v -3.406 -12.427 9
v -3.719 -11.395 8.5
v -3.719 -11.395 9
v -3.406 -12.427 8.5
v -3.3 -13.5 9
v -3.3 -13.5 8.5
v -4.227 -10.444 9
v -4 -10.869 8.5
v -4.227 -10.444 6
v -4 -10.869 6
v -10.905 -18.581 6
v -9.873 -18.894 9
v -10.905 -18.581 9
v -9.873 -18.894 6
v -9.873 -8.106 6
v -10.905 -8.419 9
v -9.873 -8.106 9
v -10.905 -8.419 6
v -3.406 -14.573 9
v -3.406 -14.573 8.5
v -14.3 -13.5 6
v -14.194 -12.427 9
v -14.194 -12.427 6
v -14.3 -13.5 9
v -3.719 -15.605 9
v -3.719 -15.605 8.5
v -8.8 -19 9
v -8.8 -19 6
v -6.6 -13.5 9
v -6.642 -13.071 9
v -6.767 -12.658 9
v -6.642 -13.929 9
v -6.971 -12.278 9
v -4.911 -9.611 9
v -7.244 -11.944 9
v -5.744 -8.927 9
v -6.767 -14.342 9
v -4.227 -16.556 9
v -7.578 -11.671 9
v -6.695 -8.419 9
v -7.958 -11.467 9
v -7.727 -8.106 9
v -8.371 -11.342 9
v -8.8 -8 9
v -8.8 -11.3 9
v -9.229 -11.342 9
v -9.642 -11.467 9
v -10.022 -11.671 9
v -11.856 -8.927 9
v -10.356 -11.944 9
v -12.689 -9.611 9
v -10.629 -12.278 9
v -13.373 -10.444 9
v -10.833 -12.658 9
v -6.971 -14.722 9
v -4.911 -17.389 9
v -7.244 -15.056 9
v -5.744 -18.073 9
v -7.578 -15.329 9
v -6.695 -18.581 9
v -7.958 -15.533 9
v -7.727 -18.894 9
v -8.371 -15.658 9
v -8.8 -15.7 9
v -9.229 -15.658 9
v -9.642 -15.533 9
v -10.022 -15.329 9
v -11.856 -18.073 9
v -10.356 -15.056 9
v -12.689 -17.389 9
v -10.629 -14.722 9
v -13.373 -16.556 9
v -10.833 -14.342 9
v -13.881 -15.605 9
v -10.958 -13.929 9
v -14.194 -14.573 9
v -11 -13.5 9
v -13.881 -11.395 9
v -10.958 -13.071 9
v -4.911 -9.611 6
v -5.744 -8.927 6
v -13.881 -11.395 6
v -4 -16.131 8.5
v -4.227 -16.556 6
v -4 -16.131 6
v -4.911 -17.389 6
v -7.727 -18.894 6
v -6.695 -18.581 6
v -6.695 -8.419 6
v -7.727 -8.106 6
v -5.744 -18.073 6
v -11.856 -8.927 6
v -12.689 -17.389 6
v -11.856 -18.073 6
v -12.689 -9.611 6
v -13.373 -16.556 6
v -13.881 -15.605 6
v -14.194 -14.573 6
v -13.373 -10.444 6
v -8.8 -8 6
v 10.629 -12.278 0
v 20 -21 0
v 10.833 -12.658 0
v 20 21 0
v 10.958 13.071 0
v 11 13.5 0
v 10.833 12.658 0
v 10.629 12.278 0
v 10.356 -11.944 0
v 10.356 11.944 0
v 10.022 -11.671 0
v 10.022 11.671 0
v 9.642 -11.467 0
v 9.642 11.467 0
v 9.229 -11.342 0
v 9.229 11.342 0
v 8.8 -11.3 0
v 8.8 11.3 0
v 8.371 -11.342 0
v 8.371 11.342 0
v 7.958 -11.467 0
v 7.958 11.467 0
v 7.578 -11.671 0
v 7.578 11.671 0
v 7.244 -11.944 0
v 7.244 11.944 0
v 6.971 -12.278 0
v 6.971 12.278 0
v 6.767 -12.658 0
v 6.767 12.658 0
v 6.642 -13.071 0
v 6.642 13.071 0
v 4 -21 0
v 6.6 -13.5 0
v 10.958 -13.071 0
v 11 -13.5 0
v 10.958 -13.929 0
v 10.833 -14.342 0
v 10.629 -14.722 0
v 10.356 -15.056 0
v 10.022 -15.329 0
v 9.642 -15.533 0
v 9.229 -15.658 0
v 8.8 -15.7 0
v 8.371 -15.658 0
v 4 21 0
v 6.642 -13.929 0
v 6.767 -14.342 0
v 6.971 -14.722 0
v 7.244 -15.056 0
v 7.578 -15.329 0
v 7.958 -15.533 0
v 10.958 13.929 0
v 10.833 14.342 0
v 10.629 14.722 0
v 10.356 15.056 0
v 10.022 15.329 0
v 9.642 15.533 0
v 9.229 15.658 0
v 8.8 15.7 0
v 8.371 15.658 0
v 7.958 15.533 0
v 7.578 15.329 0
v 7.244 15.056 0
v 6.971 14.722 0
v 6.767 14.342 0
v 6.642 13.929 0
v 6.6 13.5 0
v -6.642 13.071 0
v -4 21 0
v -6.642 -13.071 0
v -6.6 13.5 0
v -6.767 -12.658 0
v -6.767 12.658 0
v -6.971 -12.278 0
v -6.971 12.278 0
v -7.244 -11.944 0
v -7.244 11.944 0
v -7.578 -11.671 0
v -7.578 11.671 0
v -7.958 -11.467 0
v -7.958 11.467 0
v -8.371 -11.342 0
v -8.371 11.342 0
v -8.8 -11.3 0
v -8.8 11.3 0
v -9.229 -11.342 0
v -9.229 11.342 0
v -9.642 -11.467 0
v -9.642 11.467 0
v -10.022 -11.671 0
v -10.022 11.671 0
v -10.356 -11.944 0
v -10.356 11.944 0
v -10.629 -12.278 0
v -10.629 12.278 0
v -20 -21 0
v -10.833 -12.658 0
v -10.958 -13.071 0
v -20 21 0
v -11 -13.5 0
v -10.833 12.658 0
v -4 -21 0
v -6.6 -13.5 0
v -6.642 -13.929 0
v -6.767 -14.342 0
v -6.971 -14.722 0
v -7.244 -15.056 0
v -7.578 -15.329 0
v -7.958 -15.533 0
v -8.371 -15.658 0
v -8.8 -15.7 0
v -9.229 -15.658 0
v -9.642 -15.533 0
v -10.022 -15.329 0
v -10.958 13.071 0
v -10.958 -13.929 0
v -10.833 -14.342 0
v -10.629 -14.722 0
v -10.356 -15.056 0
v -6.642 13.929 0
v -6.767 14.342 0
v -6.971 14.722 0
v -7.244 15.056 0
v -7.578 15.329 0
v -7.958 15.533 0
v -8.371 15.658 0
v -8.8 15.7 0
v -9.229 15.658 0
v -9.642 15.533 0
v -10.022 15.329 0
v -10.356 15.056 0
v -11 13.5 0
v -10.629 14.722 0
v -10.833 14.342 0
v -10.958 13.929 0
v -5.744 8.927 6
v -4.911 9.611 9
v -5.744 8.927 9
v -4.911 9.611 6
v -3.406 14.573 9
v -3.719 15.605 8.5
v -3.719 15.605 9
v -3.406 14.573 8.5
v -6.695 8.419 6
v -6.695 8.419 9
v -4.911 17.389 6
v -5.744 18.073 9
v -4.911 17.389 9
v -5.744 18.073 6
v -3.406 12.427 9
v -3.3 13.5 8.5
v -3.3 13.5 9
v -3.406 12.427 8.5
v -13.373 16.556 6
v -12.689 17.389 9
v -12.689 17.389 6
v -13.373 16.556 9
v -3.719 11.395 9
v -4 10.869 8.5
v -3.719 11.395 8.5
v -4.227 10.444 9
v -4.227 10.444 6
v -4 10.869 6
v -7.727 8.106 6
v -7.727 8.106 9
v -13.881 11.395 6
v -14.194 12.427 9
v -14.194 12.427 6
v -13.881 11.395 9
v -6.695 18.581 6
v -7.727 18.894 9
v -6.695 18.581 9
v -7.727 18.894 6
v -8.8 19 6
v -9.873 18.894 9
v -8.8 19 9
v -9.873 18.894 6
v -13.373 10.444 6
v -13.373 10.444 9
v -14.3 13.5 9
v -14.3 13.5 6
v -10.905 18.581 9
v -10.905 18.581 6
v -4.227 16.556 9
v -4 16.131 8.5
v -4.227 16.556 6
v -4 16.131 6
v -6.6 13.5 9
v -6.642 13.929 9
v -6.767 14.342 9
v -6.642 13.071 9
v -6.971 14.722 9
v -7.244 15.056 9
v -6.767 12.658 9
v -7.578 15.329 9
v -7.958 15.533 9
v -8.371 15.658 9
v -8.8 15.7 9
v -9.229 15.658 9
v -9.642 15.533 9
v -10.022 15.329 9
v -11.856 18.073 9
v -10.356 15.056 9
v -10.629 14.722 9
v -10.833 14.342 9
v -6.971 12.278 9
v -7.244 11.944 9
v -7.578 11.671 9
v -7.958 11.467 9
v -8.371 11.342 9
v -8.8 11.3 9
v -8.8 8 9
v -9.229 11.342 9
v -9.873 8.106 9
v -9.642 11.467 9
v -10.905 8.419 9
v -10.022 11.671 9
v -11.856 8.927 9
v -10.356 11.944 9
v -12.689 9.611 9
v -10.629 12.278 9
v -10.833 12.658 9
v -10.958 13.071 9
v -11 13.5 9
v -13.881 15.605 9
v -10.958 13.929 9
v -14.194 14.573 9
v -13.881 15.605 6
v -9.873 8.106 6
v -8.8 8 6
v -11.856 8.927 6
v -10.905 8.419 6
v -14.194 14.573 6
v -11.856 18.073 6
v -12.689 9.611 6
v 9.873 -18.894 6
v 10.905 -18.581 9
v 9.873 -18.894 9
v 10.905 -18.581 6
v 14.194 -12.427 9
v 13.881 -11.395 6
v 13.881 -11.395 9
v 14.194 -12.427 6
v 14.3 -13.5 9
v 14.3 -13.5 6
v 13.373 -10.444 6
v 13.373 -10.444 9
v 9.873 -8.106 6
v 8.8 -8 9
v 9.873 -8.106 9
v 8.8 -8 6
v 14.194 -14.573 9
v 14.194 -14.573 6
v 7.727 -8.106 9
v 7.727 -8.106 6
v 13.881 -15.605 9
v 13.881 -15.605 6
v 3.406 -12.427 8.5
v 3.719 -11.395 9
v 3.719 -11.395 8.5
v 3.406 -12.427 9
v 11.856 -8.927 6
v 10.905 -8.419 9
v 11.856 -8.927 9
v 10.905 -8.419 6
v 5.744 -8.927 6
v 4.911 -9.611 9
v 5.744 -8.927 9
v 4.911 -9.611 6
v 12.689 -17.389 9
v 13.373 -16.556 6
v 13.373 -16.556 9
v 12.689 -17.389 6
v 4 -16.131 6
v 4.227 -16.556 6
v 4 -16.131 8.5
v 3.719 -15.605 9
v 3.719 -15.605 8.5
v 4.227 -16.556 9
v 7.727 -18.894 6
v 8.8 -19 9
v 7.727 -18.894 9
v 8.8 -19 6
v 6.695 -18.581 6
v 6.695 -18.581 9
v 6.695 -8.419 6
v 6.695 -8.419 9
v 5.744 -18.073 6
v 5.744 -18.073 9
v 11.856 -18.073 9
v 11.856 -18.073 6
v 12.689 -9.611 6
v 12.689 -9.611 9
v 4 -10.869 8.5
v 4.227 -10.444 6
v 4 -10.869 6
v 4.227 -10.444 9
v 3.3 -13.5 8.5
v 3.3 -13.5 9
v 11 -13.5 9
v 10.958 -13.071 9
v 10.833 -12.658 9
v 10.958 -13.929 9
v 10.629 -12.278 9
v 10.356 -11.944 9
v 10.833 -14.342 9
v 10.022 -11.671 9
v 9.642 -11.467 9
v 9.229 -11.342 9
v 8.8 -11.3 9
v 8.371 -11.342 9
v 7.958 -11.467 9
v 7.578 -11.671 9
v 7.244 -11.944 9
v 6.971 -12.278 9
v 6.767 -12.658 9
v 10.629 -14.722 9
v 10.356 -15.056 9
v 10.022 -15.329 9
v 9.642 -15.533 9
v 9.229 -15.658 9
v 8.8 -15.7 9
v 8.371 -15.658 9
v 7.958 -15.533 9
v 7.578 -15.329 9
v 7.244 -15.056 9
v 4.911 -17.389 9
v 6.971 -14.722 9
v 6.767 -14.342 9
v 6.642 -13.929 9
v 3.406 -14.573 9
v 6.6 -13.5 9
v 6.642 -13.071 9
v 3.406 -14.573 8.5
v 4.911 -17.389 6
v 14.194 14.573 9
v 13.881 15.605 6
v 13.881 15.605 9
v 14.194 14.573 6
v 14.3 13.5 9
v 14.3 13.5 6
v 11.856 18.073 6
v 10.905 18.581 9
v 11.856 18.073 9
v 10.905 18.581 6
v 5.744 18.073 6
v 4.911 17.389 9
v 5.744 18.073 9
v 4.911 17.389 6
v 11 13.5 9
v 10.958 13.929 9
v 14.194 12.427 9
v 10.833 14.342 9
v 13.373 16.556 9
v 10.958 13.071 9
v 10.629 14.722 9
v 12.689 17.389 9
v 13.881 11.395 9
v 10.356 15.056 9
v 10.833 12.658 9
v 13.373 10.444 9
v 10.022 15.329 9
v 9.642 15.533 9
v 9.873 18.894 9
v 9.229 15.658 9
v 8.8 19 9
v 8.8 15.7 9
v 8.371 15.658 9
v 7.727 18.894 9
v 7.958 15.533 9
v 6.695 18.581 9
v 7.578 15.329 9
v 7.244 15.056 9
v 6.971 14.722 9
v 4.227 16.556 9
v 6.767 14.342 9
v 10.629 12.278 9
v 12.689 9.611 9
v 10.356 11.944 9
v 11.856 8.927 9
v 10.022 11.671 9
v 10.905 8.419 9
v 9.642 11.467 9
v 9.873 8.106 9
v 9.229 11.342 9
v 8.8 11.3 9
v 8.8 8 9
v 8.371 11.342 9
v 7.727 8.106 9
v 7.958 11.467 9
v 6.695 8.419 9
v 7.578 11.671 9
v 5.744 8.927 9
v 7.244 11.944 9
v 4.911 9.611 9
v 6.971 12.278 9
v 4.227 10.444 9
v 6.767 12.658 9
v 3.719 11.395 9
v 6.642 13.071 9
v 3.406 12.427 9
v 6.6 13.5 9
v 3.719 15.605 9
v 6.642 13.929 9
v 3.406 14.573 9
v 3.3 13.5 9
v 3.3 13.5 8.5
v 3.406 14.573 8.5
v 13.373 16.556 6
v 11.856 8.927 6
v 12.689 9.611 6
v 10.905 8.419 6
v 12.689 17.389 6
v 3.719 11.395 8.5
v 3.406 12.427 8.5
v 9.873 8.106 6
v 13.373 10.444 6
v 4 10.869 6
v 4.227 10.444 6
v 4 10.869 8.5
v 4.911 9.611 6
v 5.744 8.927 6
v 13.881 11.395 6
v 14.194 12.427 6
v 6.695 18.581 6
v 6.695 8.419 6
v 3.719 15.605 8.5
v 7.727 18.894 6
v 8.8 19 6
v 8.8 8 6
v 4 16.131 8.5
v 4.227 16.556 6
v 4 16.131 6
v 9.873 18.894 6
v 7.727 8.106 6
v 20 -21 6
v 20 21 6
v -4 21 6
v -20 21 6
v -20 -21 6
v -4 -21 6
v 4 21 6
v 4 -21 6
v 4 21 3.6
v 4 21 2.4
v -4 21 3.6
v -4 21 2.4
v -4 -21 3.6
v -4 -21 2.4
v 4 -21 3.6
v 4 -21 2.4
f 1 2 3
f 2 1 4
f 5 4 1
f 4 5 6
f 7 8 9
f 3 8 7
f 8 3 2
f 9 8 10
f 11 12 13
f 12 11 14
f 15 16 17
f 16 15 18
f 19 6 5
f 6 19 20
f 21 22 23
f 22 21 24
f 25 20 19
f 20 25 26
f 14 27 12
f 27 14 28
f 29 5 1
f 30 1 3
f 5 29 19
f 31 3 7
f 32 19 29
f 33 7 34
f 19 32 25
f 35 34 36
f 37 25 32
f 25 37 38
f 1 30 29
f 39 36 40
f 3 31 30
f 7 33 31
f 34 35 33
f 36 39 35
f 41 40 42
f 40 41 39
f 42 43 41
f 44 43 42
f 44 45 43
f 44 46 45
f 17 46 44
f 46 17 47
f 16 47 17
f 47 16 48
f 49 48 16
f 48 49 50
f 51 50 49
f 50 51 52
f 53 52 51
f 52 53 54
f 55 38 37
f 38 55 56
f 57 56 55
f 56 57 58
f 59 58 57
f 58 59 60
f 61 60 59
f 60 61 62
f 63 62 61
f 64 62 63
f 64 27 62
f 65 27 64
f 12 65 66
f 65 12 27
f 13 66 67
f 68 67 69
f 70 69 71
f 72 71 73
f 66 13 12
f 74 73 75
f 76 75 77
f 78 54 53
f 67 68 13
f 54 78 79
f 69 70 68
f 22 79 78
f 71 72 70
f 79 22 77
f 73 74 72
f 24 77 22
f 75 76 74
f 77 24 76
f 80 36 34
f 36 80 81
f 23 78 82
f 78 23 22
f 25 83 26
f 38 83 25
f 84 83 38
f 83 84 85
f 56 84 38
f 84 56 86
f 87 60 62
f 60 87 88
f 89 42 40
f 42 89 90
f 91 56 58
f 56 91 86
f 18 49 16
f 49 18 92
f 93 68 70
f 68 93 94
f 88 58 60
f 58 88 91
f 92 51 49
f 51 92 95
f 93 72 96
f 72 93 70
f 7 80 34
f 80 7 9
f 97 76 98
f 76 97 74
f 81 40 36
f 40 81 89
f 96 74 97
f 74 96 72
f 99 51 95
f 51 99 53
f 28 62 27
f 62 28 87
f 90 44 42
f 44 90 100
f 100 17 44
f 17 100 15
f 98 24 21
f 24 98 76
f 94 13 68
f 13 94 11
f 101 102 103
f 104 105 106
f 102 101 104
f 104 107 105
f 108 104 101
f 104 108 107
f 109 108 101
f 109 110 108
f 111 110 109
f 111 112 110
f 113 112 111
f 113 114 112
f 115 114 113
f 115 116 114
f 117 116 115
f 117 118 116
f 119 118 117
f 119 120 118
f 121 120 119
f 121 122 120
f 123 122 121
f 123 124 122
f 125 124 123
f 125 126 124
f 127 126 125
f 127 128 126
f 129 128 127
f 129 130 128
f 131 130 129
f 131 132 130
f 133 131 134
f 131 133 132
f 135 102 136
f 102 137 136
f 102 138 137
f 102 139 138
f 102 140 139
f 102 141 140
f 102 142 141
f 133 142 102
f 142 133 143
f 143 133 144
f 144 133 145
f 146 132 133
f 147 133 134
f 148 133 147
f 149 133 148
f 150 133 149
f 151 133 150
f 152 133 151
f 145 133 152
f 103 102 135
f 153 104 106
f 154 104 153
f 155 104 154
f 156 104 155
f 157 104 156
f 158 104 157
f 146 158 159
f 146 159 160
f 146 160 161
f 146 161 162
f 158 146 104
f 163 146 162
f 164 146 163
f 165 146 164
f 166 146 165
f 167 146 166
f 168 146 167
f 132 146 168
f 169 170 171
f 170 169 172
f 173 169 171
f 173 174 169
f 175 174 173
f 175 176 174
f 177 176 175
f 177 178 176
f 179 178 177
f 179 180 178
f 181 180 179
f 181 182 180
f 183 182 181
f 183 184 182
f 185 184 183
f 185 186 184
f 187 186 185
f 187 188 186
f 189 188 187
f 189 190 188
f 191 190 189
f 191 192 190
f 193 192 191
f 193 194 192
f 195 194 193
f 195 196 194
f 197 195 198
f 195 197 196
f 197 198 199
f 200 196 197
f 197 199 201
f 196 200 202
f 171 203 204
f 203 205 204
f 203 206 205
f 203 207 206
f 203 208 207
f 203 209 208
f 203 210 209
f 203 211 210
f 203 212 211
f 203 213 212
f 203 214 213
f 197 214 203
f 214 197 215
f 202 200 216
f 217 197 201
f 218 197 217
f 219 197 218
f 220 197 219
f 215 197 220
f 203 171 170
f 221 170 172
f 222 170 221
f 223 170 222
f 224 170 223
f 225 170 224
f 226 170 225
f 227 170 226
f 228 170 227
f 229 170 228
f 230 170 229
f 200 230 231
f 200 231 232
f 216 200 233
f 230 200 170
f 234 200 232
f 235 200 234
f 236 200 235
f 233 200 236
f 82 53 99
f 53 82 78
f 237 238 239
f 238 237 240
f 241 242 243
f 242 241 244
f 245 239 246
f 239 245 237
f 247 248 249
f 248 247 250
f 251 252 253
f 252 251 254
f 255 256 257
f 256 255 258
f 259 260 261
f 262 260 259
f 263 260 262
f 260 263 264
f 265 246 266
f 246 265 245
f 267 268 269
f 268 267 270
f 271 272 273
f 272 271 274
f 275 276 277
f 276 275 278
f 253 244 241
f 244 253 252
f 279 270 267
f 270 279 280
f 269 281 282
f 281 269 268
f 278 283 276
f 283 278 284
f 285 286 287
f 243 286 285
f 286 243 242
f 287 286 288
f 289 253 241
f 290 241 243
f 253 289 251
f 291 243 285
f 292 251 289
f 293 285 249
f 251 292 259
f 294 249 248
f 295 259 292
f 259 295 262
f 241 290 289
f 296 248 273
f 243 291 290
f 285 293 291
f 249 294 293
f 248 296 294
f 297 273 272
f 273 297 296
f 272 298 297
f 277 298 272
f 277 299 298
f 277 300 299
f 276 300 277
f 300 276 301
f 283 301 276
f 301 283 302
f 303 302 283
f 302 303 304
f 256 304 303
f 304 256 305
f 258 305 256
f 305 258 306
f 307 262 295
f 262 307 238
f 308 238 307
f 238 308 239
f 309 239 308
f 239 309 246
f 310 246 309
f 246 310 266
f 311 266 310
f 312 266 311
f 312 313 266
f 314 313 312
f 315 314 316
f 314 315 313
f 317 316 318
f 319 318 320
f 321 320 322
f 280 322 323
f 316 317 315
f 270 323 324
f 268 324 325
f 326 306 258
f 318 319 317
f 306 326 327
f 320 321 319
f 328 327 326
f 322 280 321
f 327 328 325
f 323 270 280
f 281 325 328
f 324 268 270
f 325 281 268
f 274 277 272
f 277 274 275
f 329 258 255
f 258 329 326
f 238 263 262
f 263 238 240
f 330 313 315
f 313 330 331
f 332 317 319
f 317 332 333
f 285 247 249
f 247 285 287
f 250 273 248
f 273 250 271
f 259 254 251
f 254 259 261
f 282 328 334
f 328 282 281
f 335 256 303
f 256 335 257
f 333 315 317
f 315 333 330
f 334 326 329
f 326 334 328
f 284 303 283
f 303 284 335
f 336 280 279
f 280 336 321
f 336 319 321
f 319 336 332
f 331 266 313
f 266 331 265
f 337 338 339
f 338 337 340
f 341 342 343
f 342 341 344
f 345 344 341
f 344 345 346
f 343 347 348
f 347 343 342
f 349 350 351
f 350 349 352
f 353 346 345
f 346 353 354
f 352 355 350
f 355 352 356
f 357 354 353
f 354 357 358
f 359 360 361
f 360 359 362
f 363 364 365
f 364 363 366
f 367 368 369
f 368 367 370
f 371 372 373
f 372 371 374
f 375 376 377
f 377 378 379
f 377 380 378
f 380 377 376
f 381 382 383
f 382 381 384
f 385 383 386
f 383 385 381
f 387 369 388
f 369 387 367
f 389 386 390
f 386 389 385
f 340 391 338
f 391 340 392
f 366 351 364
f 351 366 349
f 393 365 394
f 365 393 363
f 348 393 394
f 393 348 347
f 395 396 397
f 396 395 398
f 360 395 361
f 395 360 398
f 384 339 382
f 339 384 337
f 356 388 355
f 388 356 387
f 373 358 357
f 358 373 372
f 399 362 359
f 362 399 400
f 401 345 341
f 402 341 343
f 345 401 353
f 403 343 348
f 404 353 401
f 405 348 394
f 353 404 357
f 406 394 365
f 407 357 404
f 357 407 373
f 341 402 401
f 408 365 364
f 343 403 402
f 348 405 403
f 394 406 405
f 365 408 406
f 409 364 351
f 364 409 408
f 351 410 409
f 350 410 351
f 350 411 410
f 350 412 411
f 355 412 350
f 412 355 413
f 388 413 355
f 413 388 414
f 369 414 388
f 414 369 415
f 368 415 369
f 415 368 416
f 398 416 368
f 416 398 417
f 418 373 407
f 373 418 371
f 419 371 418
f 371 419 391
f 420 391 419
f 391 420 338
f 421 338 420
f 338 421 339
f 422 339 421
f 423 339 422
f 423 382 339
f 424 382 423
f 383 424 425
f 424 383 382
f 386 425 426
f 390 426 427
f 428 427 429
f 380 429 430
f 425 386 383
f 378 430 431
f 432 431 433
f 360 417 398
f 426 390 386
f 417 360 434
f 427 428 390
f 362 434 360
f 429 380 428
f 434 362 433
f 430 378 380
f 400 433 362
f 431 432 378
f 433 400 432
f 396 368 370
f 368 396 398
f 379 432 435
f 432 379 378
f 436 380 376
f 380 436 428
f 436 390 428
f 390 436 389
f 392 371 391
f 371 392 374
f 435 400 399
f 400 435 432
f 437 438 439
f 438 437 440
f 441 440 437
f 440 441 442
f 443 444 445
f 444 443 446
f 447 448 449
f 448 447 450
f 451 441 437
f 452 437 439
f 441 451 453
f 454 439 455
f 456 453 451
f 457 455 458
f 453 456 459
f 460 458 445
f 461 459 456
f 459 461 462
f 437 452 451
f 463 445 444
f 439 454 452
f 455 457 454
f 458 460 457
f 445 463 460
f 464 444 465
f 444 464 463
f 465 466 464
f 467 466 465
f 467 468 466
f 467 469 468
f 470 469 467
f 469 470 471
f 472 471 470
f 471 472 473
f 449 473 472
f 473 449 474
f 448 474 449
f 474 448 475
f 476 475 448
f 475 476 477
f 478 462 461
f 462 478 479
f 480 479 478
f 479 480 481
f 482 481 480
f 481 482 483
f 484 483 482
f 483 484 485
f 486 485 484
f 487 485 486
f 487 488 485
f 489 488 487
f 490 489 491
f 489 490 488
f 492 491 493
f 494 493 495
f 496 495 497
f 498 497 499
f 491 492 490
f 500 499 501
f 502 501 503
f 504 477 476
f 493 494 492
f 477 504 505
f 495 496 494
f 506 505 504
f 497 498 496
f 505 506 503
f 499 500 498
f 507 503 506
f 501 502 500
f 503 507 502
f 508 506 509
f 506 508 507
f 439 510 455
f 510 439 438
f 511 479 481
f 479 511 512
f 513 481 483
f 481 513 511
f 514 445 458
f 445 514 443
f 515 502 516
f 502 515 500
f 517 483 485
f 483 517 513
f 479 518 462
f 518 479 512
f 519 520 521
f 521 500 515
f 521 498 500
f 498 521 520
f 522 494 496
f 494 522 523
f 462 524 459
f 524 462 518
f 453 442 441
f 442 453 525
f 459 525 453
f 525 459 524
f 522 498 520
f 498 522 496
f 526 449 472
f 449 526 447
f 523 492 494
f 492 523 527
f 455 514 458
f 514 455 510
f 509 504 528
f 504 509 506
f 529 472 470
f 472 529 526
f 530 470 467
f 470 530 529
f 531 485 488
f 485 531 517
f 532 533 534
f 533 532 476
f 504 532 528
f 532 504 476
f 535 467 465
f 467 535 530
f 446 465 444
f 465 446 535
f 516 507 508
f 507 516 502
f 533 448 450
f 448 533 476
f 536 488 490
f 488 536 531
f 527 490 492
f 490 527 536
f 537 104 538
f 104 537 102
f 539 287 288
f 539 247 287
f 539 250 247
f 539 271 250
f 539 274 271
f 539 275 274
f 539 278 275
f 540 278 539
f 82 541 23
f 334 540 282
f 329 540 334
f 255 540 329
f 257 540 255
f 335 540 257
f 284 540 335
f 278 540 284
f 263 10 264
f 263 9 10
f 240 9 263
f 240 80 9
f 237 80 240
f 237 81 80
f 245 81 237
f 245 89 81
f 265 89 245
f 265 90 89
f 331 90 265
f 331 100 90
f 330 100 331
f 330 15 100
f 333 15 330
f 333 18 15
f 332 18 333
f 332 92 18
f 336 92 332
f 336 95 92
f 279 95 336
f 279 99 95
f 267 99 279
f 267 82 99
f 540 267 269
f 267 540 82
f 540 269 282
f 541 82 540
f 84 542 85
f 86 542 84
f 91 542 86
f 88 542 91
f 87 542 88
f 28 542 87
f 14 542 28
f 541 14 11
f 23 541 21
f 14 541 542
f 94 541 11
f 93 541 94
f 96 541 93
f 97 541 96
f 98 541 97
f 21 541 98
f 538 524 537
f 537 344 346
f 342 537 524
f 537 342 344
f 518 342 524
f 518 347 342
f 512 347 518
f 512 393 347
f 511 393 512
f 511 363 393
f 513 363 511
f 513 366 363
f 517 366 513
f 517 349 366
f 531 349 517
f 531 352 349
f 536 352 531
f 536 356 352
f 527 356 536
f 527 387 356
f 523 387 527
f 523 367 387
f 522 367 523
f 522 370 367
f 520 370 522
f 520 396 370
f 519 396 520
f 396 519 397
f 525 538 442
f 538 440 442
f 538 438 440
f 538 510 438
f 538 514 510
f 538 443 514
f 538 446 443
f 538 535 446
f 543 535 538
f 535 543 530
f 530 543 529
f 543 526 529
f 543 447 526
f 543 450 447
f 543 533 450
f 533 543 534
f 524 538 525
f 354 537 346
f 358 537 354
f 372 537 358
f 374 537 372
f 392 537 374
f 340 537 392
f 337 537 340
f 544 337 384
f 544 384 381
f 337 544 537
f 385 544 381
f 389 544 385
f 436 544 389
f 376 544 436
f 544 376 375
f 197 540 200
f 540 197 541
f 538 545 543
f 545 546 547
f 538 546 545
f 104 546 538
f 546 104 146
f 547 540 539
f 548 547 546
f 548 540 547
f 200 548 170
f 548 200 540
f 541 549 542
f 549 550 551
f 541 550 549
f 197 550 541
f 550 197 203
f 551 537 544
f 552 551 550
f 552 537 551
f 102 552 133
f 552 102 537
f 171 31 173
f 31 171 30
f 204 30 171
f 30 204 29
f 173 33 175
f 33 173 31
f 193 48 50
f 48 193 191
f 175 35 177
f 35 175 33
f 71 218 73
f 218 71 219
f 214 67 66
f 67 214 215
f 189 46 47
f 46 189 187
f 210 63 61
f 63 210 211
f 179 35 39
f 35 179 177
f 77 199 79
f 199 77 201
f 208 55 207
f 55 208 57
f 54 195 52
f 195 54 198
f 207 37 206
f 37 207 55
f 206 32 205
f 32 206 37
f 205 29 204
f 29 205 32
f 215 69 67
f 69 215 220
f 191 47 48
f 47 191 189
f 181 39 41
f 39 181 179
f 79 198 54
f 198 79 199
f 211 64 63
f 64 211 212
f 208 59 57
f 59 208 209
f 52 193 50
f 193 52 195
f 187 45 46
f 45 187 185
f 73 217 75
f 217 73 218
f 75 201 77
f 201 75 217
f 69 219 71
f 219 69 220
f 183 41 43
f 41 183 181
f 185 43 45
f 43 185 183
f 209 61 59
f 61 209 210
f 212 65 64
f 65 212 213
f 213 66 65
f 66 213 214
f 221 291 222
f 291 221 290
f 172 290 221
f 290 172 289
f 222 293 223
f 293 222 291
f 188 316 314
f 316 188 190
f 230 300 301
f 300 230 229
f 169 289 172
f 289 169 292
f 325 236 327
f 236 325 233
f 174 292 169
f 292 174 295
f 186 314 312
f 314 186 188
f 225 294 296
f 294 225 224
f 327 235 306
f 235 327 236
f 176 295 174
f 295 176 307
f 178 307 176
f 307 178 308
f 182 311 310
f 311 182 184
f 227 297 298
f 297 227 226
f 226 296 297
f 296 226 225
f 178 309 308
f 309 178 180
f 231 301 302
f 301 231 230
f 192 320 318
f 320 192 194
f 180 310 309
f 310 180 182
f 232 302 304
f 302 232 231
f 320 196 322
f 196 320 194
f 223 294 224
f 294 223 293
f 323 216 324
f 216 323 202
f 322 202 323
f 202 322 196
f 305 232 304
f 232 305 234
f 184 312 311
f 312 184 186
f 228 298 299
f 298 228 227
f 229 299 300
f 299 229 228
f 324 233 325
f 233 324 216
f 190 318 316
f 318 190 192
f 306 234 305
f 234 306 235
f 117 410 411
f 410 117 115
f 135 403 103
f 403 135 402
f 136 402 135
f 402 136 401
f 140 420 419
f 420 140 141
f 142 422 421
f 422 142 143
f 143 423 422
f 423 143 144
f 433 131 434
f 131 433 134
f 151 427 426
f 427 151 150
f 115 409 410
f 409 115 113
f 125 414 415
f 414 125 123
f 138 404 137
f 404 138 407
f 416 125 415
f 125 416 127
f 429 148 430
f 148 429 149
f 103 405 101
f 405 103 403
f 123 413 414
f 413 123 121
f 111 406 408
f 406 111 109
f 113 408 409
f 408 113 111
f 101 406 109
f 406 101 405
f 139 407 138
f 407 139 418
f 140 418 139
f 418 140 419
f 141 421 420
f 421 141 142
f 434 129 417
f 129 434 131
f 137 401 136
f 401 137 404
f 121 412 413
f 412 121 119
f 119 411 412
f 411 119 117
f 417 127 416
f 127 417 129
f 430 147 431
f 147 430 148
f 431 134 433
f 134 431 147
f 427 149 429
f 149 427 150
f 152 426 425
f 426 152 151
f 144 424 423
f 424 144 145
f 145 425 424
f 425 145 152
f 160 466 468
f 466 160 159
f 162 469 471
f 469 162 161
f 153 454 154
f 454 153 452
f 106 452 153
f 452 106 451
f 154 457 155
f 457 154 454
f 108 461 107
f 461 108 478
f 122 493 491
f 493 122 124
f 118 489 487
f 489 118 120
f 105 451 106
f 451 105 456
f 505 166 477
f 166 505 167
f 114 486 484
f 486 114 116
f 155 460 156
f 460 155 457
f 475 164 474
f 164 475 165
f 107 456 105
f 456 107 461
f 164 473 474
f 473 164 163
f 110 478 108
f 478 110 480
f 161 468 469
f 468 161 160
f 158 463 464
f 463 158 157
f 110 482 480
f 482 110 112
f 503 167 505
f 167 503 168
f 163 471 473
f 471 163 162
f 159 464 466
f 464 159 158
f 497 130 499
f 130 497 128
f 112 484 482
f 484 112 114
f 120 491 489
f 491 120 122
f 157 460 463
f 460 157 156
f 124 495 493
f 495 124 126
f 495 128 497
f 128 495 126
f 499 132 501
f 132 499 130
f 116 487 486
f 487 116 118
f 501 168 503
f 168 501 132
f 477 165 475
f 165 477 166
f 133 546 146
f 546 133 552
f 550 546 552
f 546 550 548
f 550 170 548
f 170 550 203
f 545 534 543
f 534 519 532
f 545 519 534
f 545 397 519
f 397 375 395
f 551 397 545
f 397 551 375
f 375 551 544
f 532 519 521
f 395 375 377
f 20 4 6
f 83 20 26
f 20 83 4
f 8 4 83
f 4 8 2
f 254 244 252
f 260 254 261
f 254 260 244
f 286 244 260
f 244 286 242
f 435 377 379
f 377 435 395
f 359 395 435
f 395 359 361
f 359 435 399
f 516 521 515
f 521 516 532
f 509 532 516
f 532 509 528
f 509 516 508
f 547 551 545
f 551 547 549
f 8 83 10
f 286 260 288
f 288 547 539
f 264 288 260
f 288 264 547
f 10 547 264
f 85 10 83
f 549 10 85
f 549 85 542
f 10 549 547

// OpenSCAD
$fn = 32;

// ----------------------------------------------------------------------
// Living hinge: 40 x 42 mm plates, 1.2 mm flexible web
// ----------------------------------------------------------------------

// --- parameters (mm) ---
plate_len = 16;           // plate length outside the web
plate_w = 42;             // plate width
thick = 6;                // plate thickness
web_half = 4;             // half width of the flex band
web_t = 1.2;              // flexible web thickness
web_z = 2.4;              // web position inside the thickness
boss_d = 11;              // screw boss diameter
boss_h = 9;               // screw boss height
boss_x = 8.8;             // screw boss distance from the web
screw_d = 4.4;            // screw hole

difference() {
  union() {
    /* one flat strip, later thinned at the middle */
    translate([-20, -21, 0]) cube([40, 42, 6]);
    /* screw bosses, sunk 0.5 mm into the plates */
    for (sx = [-8.8, 8.8]) {
      for (sy = [-13.5, 13.5]) {
        translate([sx, sy, 0]) cylinder(h = boss_h, d = boss_d);
      }
    }
  }
  /* channel from below: leaves the web on top of it */
  translate([-4, -23.5, -2.5]) cube([8, 47, 4.9]);
  /* channel from above: thins the web down to web_t */
  translate([-4, -23.5, 3.6]) cube([8, 47, 4.9]);
  /* screw holes through the bosses */
  for (sx = [-8.8, 8.8]) {
    for (sy = [-13.5, 13.5]) {
      translate([sx, sy, -2.5]) cylinder(h = boss_h + 5, d = screw_d);
    }
  }
}
